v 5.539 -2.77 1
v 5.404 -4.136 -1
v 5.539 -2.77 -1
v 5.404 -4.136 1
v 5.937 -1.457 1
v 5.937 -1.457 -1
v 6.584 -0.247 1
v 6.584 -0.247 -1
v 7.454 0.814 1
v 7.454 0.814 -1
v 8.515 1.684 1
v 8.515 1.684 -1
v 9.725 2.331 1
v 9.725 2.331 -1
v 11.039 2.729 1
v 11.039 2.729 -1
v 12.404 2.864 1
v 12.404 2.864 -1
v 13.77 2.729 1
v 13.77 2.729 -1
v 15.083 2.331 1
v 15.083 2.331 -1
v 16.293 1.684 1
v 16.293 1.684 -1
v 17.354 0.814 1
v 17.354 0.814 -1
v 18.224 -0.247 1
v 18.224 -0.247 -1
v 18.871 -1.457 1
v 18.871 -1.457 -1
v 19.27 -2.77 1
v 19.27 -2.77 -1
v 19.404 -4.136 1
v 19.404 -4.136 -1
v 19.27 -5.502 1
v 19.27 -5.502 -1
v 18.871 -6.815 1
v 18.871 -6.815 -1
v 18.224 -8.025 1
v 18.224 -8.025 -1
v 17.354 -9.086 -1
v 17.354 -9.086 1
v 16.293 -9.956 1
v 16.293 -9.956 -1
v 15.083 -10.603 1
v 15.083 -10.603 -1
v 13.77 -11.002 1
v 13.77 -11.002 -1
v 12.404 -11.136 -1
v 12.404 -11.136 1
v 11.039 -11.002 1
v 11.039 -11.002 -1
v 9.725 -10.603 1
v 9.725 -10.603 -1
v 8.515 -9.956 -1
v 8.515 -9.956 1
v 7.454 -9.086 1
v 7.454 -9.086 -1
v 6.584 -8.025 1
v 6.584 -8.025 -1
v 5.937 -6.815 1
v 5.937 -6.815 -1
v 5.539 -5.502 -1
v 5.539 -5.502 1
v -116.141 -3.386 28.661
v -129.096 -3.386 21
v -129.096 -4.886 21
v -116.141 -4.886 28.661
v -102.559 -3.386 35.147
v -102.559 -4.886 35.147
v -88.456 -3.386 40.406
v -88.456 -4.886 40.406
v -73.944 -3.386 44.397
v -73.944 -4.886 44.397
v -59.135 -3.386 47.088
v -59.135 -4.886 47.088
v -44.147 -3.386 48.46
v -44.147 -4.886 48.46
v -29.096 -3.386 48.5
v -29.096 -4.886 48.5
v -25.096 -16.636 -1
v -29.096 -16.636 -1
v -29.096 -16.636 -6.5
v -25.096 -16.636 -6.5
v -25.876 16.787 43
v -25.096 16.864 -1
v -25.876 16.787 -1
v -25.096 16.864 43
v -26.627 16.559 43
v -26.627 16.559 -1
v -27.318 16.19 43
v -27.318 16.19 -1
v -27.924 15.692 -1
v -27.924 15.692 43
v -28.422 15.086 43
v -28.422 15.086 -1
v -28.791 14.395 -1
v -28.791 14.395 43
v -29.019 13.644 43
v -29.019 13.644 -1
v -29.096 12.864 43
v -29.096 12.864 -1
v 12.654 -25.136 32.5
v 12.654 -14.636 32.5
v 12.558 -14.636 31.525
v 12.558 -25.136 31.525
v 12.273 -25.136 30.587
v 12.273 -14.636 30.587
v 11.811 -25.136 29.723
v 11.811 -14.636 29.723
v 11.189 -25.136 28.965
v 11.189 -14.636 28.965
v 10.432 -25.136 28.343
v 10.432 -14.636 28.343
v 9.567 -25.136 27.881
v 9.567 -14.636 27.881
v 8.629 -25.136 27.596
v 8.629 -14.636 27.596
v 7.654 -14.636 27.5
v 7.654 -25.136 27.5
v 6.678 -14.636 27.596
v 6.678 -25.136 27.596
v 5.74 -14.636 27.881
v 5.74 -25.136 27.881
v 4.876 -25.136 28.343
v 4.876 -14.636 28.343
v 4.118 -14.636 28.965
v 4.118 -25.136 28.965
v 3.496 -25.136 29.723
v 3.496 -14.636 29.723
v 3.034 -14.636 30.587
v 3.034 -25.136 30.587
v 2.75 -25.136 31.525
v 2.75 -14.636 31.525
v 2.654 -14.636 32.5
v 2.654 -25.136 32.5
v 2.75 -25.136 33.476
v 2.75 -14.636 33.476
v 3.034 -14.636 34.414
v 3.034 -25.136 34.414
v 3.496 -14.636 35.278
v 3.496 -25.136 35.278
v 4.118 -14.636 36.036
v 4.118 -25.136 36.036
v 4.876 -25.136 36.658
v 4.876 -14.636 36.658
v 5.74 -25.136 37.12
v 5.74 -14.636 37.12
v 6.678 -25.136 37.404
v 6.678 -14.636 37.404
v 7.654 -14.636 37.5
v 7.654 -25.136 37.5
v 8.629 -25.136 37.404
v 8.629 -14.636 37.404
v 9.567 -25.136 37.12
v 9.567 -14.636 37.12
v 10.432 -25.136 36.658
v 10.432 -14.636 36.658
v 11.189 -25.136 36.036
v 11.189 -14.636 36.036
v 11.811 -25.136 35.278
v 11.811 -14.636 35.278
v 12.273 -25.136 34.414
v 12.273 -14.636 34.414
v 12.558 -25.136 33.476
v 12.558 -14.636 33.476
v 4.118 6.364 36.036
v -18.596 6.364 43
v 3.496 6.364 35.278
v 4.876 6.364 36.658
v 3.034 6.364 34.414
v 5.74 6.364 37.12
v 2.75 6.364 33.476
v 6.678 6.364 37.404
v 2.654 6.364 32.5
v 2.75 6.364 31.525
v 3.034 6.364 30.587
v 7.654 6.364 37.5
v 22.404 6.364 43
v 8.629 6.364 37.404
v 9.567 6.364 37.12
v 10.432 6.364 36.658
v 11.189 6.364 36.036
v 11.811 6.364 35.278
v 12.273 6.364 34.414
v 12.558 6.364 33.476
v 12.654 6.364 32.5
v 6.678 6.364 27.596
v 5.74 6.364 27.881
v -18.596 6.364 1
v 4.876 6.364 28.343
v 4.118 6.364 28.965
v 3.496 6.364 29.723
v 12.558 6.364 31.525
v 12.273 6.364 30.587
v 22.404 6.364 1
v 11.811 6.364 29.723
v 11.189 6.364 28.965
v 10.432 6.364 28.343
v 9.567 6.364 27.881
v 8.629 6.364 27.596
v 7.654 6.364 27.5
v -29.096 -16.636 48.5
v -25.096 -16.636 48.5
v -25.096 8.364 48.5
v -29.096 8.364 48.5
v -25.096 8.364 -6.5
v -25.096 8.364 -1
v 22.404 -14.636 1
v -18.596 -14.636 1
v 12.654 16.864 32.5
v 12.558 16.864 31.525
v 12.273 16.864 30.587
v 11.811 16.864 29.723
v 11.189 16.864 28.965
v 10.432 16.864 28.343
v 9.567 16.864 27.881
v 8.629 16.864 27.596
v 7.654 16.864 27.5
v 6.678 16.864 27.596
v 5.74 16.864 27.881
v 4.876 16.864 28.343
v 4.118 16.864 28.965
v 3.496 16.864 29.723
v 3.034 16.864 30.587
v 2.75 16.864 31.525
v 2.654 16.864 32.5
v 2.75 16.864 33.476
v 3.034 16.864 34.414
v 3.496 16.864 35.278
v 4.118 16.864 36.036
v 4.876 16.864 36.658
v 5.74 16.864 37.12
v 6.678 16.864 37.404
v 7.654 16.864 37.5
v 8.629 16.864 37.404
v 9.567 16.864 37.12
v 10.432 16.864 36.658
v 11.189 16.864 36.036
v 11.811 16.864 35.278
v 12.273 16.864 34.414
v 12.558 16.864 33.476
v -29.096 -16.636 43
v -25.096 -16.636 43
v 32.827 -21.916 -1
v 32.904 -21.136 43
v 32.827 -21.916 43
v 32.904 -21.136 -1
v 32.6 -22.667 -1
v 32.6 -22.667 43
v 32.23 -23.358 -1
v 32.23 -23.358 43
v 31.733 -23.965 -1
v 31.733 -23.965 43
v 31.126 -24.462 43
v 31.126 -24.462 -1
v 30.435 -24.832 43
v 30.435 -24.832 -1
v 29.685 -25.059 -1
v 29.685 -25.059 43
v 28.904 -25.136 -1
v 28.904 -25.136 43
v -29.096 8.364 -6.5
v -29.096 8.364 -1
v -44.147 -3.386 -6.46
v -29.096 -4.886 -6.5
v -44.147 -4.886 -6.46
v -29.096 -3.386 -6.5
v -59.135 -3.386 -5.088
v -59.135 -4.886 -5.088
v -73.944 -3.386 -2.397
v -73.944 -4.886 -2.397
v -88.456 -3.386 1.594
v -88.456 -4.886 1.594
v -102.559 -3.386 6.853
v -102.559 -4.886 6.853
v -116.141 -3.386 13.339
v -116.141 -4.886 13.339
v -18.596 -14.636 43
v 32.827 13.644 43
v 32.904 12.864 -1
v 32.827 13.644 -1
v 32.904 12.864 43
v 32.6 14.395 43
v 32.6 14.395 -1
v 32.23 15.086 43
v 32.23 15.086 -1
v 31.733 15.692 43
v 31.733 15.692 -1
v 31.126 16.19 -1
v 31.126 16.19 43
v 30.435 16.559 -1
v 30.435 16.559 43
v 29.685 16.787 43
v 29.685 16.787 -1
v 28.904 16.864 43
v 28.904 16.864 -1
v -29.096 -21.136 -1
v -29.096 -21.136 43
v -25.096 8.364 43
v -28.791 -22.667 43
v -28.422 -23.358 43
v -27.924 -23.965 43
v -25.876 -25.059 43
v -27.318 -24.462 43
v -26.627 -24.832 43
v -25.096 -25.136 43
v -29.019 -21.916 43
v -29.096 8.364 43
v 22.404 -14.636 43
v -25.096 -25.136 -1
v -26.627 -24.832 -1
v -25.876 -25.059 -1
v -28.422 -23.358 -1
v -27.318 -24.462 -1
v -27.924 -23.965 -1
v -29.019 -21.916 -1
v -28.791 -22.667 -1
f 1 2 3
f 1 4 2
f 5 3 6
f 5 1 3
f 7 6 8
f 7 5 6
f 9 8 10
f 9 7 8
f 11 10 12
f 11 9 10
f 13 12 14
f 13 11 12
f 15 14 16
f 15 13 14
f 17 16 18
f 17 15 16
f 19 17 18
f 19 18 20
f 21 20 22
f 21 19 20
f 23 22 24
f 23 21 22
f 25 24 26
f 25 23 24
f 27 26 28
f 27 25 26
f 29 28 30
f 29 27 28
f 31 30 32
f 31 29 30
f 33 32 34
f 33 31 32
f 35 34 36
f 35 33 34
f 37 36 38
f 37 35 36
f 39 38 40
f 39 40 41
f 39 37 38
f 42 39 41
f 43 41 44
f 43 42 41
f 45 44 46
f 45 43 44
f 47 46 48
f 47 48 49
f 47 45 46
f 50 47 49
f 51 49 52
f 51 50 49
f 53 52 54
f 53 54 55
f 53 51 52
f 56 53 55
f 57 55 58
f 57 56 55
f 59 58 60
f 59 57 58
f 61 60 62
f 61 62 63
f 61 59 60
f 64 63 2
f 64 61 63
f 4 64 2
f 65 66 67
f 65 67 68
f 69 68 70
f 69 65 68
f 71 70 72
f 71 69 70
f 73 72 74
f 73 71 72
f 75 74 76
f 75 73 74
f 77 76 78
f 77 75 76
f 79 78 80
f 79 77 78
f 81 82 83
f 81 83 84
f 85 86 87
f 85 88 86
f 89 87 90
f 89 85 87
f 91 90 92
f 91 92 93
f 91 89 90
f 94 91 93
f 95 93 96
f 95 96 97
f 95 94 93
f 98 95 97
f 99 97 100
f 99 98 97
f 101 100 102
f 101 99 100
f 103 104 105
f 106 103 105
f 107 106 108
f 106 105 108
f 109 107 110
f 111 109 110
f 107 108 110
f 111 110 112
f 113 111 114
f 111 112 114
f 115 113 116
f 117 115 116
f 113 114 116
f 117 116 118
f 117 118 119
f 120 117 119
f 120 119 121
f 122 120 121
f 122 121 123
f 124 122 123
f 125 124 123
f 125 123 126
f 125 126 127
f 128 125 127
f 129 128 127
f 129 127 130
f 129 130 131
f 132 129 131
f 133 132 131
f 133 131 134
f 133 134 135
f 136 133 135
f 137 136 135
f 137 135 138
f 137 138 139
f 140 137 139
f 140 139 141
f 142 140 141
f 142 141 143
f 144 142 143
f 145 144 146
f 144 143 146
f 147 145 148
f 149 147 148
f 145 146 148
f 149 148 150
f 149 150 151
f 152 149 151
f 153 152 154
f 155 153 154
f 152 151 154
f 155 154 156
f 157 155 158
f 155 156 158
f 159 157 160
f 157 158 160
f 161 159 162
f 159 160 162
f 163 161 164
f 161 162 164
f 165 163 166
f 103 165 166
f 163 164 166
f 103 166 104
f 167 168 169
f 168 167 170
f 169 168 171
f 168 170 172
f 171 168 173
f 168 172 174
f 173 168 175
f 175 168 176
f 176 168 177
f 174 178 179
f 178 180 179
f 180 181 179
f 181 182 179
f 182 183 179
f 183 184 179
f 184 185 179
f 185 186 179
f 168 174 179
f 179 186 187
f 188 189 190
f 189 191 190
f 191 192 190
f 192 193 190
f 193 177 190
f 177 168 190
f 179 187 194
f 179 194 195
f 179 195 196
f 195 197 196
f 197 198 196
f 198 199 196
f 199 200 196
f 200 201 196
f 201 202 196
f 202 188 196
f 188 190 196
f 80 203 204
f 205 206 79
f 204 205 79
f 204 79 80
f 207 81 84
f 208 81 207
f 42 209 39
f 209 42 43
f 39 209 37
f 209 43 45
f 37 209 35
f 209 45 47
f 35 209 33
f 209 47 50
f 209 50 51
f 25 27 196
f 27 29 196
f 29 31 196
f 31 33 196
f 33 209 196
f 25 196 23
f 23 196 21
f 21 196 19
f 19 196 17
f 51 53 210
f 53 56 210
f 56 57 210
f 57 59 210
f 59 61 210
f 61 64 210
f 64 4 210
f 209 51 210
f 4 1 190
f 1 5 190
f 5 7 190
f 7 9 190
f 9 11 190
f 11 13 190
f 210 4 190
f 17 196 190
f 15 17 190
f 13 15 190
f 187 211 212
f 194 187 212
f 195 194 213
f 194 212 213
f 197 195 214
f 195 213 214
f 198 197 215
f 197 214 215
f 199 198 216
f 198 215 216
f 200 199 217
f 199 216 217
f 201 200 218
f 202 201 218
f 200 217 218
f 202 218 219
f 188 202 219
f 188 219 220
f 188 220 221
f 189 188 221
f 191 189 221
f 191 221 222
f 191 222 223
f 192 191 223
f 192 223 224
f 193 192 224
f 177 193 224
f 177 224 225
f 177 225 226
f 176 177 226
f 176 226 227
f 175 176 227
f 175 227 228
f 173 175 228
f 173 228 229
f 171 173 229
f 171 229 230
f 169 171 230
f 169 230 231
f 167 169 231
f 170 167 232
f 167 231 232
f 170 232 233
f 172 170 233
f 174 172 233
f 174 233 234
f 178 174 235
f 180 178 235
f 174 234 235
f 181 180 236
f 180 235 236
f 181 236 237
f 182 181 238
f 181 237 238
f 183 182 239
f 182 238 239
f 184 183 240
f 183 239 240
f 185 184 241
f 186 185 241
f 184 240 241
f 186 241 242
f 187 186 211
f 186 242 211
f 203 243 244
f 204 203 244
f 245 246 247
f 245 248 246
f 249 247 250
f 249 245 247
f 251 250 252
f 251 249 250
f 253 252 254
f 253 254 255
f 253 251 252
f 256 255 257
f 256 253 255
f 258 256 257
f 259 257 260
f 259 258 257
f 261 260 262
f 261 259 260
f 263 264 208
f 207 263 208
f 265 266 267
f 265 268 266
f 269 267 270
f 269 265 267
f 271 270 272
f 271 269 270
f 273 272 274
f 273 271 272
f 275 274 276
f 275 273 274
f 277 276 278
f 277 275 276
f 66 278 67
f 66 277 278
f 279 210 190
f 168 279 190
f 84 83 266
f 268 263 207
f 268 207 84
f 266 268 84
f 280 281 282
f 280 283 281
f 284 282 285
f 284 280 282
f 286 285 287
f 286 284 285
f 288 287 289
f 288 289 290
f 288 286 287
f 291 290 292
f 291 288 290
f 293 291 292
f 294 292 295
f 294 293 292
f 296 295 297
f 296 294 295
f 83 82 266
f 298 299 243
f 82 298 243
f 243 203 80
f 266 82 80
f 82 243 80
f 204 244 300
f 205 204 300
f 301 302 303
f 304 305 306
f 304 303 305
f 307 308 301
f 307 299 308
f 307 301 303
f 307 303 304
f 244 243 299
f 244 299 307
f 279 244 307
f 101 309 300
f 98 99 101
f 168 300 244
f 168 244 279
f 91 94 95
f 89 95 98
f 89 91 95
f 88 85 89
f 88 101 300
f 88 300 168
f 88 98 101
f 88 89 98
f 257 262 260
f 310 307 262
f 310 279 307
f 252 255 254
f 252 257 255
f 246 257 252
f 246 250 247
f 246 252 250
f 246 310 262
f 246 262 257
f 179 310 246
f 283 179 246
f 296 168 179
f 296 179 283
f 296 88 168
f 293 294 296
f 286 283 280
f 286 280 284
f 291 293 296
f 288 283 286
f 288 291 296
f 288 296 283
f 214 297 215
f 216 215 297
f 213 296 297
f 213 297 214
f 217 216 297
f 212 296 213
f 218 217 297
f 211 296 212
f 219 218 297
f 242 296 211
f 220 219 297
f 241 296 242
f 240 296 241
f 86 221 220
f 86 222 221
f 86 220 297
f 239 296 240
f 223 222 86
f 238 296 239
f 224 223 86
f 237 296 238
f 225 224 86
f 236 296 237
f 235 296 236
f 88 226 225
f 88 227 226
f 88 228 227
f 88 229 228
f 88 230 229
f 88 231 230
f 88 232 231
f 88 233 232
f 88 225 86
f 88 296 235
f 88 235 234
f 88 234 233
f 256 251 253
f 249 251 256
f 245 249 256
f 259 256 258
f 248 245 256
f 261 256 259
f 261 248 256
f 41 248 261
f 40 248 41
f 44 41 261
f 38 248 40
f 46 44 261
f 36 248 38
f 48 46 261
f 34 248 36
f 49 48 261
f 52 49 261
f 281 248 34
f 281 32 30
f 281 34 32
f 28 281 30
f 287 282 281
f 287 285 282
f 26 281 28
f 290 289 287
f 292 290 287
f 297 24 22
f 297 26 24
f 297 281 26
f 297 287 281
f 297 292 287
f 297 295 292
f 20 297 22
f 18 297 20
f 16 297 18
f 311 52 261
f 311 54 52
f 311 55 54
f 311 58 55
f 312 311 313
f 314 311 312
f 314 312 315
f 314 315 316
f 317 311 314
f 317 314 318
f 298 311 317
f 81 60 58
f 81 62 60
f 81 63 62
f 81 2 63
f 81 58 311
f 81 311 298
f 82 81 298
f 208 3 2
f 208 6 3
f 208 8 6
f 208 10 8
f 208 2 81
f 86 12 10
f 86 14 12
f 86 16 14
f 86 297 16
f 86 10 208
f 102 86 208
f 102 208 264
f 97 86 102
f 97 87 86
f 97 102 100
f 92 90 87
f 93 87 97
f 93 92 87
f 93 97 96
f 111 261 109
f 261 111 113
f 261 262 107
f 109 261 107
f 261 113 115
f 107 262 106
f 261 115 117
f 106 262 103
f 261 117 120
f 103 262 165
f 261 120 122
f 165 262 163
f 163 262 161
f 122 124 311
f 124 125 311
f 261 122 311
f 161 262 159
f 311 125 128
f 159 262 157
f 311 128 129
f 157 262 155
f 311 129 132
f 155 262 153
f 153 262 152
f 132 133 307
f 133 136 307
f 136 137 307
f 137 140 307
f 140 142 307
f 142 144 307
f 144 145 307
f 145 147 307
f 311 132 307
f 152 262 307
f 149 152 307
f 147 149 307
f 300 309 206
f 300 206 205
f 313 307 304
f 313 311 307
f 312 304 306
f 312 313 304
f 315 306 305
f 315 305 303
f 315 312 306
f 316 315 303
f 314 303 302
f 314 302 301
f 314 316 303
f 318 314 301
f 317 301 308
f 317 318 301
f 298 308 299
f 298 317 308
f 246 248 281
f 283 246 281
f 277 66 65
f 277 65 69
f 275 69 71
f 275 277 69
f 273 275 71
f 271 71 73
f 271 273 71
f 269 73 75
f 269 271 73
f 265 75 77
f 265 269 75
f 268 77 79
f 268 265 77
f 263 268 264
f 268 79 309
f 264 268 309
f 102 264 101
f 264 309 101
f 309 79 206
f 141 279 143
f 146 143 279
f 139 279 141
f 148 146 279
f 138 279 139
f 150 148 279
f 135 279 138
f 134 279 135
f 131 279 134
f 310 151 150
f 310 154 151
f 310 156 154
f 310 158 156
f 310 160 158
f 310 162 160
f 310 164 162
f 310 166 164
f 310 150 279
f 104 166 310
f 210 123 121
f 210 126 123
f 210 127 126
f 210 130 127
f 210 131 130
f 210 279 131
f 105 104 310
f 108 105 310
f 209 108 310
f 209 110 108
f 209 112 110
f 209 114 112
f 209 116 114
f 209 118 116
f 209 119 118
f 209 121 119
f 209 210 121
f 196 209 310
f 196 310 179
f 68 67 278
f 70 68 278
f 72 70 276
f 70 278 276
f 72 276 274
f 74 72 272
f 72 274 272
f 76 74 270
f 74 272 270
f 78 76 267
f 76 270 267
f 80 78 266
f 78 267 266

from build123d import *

# Parameters (mm, degrees)
SKETCH1_W           = 62
SKETCH1_H           = 42
SKETCH1_W_2         = 41
SKETCH1_H_2         = 21
BOSS_EXTRUDE1_DEPTH = 43
SKETCH2_W           = 4
SKETCH2_H           = 25
BOSS_EXTRUDE2_DEPTH = 5.5
SKETCH_1_R          = 5
CUT_EXTRUDE_1_DEPTH = 42
SKETCH_2_W          = 41
SKETCH_2_H          = 21
SKETCH_2_R          = 7
EXTRUDE_1_DEPTH     = 1
SKETCH_2_3_W        = 62
SKETCH_2_3_H        = 42
SKETCH_2_3_R        = 7
EXTRUDE_2_DEPTH     = 1
FILLET_1_R          = 4
FILLET_2_R          = 4
FILLET_3_R          = 4
FILLET_4_R          = 4
SKETCH2_3_W         = 4
SKETCH2_3_H         = 25
EXTRUDE_3_DEPTH     = 49.5
EXTRUDE_4_DEPTH     = 0.75
EXTRUDE_5_DEPTH     = 0.75


with BuildPart() as part:
    # Sketch1 → Boss-Extrude1 (new body)
    with BuildSketch(Plane.XY):
        with Locations((1.904162196, -4.136072895)):
            Rectangle(SKETCH1_W, SKETCH1_H)
        with Locations((1.904162196, -4.136072895)):
            Rectangle(SKETCH1_W_2, SKETCH1_H_2, mode=Mode.SUBTRACT)
    extrude(amount=BOSS_EXTRUDE1_DEPTH)

    # Sketch2 → Boss-Extrude2 (add)
    with BuildSketch(Plane.XY.offset(43)):
        with Locations((-27.095837804, -4.136072895)):
            Rectangle(SKETCH2_W, SKETCH2_H)
    extrude(amount=BOSS_EXTRUDE2_DEPTH)

    # Sketch 1 → Cut-Extrude 1 (cut)
    with BuildSketch(Plane(origin=(0, 16.863927105, 0), x_dir=(1, 0, 0), z_dir=(0, 1, 0))):
        with Locations((7.653776732, -32.500385465)):
            Circle(SKETCH_1_R)
    extrude(amount=-CUT_EXTRUDE_1_DEPTH, mode=Mode.SUBTRACT)

    # Sketch 2 → Extrude 1 (add)
    with BuildSketch(Plane(origin=(0, 0, 0), x_dir=(-1, 0, 0), z_dir=(0, 0, -1))):
        with Locations((-1.904162196, -4.136072895)):
            Rectangle(SKETCH_2_W, SKETCH_2_H)
        with Locations((-12.404162196, -4.136072895)):
            Circle(SKETCH_2_R, mode=Mode.SUBTRACT)
    extrude(amount=-EXTRUDE_1_DEPTH)

    # Sketch 2_3 → Extrude 2 (add)
    with BuildSketch(Plane(origin=(0, 0, 0), x_dir=(-1, 0, 0), z_dir=(0, 0, -1))):
        with Locations((-1.904162196, -4.136072895)):
            Rectangle(SKETCH_2_3_W, SKETCH_2_3_H)
        with Locations((-12.404162196, -4.136072895)):
            Circle(SKETCH_2_3_R, mode=Mode.SUBTRACT)
    extrude(amount=EXTRUDE_2_DEPTH)

    # Fillet 1
    fillet_1_edges = [part.edges().sort_by_distance(p)[0] for p in [
        (32.904162196, -25.136072895, 21),
    ]]
    fillet(fillet_1_edges, radius=FILLET_1_R)

    # Fillet 2
    fillet_2_edges = [part.edges().sort_by_distance(p)[0] for p in [
        (-29.095837804, -25.136072895, 21),
    ]]
    fillet(fillet_2_edges, radius=FILLET_2_R)

    # Fillet 3
    fillet_3_edges = [part.edges().sort_by_distance(p)[0] for p in [
        (32.904162196, 16.863927105, 21),
    ]]
    fillet(fillet_3_edges, radius=FILLET_3_R)

    # Fillet 4
    fillet_4_edges = [part.edges().sort_by_distance(p)[0] for p in [
        (-29.095837804, 16.863927105, 21),
    ]]
    fillet(fillet_4_edges, radius=FILLET_4_R)

    # Sketch2_3 → Extrude 3 (add)
    with BuildSketch(Plane.XY.offset(43)):
        with Locations((-27.095837804, -4.136072895)):
            Rectangle(SKETCH2_3_W, SKETCH2_3_H)
    extrude(amount=-EXTRUDE_3_DEPTH)

    # Sketch 5 → Extrude 4 (add)
    with BuildSketch(Plane(origin=(0, -4.136072895, 0), x_dir=(1, 0, 0), z_dir=(0, 1, 0))):
        with BuildLine():
            Line((-29.095837804, -21), (-29.095837804, 6.5))
            ThreePointArc((-29.095837804, 6.5), (-81.244156023, 0.562066252), (-129.095837804, -21))
            Line((-129.095837804, -21), (-29.095837804, -21))
        make_face()
        with BuildLine():
            Line((-29.095837804, -48.5), (-29.095837804, -21))
            Line((-29.095837804, -21), (-129.095837804, -21))
            ThreePointArc((-129.095837804, -21), (-81.244156023, -42.562066252), (-29.095837804, -48.5))
        make_face()
    extrude(amount=EXTRUDE_4_DEPTH)

    # Sketch 5_3 → Extrude 5 (add)
    with BuildSketch(Plane(origin=(0, -4.136072895, 0), x_dir=(1, 0, 0), z_dir=(0, 1, 0))):
        with BuildLine():
            Line((-29.095837804, -21), (-29.095837804, 6.5))
            ThreePointArc((-29.095837804, 6.5), (-81.244156023, 0.562066252), (-129.095837804, -21))
            Line((-129.095837804, -21), (-29.095837804, -21))
        make_face()
        with BuildLine():
            Line((-29.095837804, -48.5), (-29.095837804, -21))
            Line((-29.095837804, -21), (-129.095837804, -21))
            ThreePointArc((-129.095837804, -21), (-81.244156023, -42.562066252), (-29.095837804, -48.5))
        make_face()
    extrude(amount=-EXTRUDE_5_DEPTH)


solid = part.part
